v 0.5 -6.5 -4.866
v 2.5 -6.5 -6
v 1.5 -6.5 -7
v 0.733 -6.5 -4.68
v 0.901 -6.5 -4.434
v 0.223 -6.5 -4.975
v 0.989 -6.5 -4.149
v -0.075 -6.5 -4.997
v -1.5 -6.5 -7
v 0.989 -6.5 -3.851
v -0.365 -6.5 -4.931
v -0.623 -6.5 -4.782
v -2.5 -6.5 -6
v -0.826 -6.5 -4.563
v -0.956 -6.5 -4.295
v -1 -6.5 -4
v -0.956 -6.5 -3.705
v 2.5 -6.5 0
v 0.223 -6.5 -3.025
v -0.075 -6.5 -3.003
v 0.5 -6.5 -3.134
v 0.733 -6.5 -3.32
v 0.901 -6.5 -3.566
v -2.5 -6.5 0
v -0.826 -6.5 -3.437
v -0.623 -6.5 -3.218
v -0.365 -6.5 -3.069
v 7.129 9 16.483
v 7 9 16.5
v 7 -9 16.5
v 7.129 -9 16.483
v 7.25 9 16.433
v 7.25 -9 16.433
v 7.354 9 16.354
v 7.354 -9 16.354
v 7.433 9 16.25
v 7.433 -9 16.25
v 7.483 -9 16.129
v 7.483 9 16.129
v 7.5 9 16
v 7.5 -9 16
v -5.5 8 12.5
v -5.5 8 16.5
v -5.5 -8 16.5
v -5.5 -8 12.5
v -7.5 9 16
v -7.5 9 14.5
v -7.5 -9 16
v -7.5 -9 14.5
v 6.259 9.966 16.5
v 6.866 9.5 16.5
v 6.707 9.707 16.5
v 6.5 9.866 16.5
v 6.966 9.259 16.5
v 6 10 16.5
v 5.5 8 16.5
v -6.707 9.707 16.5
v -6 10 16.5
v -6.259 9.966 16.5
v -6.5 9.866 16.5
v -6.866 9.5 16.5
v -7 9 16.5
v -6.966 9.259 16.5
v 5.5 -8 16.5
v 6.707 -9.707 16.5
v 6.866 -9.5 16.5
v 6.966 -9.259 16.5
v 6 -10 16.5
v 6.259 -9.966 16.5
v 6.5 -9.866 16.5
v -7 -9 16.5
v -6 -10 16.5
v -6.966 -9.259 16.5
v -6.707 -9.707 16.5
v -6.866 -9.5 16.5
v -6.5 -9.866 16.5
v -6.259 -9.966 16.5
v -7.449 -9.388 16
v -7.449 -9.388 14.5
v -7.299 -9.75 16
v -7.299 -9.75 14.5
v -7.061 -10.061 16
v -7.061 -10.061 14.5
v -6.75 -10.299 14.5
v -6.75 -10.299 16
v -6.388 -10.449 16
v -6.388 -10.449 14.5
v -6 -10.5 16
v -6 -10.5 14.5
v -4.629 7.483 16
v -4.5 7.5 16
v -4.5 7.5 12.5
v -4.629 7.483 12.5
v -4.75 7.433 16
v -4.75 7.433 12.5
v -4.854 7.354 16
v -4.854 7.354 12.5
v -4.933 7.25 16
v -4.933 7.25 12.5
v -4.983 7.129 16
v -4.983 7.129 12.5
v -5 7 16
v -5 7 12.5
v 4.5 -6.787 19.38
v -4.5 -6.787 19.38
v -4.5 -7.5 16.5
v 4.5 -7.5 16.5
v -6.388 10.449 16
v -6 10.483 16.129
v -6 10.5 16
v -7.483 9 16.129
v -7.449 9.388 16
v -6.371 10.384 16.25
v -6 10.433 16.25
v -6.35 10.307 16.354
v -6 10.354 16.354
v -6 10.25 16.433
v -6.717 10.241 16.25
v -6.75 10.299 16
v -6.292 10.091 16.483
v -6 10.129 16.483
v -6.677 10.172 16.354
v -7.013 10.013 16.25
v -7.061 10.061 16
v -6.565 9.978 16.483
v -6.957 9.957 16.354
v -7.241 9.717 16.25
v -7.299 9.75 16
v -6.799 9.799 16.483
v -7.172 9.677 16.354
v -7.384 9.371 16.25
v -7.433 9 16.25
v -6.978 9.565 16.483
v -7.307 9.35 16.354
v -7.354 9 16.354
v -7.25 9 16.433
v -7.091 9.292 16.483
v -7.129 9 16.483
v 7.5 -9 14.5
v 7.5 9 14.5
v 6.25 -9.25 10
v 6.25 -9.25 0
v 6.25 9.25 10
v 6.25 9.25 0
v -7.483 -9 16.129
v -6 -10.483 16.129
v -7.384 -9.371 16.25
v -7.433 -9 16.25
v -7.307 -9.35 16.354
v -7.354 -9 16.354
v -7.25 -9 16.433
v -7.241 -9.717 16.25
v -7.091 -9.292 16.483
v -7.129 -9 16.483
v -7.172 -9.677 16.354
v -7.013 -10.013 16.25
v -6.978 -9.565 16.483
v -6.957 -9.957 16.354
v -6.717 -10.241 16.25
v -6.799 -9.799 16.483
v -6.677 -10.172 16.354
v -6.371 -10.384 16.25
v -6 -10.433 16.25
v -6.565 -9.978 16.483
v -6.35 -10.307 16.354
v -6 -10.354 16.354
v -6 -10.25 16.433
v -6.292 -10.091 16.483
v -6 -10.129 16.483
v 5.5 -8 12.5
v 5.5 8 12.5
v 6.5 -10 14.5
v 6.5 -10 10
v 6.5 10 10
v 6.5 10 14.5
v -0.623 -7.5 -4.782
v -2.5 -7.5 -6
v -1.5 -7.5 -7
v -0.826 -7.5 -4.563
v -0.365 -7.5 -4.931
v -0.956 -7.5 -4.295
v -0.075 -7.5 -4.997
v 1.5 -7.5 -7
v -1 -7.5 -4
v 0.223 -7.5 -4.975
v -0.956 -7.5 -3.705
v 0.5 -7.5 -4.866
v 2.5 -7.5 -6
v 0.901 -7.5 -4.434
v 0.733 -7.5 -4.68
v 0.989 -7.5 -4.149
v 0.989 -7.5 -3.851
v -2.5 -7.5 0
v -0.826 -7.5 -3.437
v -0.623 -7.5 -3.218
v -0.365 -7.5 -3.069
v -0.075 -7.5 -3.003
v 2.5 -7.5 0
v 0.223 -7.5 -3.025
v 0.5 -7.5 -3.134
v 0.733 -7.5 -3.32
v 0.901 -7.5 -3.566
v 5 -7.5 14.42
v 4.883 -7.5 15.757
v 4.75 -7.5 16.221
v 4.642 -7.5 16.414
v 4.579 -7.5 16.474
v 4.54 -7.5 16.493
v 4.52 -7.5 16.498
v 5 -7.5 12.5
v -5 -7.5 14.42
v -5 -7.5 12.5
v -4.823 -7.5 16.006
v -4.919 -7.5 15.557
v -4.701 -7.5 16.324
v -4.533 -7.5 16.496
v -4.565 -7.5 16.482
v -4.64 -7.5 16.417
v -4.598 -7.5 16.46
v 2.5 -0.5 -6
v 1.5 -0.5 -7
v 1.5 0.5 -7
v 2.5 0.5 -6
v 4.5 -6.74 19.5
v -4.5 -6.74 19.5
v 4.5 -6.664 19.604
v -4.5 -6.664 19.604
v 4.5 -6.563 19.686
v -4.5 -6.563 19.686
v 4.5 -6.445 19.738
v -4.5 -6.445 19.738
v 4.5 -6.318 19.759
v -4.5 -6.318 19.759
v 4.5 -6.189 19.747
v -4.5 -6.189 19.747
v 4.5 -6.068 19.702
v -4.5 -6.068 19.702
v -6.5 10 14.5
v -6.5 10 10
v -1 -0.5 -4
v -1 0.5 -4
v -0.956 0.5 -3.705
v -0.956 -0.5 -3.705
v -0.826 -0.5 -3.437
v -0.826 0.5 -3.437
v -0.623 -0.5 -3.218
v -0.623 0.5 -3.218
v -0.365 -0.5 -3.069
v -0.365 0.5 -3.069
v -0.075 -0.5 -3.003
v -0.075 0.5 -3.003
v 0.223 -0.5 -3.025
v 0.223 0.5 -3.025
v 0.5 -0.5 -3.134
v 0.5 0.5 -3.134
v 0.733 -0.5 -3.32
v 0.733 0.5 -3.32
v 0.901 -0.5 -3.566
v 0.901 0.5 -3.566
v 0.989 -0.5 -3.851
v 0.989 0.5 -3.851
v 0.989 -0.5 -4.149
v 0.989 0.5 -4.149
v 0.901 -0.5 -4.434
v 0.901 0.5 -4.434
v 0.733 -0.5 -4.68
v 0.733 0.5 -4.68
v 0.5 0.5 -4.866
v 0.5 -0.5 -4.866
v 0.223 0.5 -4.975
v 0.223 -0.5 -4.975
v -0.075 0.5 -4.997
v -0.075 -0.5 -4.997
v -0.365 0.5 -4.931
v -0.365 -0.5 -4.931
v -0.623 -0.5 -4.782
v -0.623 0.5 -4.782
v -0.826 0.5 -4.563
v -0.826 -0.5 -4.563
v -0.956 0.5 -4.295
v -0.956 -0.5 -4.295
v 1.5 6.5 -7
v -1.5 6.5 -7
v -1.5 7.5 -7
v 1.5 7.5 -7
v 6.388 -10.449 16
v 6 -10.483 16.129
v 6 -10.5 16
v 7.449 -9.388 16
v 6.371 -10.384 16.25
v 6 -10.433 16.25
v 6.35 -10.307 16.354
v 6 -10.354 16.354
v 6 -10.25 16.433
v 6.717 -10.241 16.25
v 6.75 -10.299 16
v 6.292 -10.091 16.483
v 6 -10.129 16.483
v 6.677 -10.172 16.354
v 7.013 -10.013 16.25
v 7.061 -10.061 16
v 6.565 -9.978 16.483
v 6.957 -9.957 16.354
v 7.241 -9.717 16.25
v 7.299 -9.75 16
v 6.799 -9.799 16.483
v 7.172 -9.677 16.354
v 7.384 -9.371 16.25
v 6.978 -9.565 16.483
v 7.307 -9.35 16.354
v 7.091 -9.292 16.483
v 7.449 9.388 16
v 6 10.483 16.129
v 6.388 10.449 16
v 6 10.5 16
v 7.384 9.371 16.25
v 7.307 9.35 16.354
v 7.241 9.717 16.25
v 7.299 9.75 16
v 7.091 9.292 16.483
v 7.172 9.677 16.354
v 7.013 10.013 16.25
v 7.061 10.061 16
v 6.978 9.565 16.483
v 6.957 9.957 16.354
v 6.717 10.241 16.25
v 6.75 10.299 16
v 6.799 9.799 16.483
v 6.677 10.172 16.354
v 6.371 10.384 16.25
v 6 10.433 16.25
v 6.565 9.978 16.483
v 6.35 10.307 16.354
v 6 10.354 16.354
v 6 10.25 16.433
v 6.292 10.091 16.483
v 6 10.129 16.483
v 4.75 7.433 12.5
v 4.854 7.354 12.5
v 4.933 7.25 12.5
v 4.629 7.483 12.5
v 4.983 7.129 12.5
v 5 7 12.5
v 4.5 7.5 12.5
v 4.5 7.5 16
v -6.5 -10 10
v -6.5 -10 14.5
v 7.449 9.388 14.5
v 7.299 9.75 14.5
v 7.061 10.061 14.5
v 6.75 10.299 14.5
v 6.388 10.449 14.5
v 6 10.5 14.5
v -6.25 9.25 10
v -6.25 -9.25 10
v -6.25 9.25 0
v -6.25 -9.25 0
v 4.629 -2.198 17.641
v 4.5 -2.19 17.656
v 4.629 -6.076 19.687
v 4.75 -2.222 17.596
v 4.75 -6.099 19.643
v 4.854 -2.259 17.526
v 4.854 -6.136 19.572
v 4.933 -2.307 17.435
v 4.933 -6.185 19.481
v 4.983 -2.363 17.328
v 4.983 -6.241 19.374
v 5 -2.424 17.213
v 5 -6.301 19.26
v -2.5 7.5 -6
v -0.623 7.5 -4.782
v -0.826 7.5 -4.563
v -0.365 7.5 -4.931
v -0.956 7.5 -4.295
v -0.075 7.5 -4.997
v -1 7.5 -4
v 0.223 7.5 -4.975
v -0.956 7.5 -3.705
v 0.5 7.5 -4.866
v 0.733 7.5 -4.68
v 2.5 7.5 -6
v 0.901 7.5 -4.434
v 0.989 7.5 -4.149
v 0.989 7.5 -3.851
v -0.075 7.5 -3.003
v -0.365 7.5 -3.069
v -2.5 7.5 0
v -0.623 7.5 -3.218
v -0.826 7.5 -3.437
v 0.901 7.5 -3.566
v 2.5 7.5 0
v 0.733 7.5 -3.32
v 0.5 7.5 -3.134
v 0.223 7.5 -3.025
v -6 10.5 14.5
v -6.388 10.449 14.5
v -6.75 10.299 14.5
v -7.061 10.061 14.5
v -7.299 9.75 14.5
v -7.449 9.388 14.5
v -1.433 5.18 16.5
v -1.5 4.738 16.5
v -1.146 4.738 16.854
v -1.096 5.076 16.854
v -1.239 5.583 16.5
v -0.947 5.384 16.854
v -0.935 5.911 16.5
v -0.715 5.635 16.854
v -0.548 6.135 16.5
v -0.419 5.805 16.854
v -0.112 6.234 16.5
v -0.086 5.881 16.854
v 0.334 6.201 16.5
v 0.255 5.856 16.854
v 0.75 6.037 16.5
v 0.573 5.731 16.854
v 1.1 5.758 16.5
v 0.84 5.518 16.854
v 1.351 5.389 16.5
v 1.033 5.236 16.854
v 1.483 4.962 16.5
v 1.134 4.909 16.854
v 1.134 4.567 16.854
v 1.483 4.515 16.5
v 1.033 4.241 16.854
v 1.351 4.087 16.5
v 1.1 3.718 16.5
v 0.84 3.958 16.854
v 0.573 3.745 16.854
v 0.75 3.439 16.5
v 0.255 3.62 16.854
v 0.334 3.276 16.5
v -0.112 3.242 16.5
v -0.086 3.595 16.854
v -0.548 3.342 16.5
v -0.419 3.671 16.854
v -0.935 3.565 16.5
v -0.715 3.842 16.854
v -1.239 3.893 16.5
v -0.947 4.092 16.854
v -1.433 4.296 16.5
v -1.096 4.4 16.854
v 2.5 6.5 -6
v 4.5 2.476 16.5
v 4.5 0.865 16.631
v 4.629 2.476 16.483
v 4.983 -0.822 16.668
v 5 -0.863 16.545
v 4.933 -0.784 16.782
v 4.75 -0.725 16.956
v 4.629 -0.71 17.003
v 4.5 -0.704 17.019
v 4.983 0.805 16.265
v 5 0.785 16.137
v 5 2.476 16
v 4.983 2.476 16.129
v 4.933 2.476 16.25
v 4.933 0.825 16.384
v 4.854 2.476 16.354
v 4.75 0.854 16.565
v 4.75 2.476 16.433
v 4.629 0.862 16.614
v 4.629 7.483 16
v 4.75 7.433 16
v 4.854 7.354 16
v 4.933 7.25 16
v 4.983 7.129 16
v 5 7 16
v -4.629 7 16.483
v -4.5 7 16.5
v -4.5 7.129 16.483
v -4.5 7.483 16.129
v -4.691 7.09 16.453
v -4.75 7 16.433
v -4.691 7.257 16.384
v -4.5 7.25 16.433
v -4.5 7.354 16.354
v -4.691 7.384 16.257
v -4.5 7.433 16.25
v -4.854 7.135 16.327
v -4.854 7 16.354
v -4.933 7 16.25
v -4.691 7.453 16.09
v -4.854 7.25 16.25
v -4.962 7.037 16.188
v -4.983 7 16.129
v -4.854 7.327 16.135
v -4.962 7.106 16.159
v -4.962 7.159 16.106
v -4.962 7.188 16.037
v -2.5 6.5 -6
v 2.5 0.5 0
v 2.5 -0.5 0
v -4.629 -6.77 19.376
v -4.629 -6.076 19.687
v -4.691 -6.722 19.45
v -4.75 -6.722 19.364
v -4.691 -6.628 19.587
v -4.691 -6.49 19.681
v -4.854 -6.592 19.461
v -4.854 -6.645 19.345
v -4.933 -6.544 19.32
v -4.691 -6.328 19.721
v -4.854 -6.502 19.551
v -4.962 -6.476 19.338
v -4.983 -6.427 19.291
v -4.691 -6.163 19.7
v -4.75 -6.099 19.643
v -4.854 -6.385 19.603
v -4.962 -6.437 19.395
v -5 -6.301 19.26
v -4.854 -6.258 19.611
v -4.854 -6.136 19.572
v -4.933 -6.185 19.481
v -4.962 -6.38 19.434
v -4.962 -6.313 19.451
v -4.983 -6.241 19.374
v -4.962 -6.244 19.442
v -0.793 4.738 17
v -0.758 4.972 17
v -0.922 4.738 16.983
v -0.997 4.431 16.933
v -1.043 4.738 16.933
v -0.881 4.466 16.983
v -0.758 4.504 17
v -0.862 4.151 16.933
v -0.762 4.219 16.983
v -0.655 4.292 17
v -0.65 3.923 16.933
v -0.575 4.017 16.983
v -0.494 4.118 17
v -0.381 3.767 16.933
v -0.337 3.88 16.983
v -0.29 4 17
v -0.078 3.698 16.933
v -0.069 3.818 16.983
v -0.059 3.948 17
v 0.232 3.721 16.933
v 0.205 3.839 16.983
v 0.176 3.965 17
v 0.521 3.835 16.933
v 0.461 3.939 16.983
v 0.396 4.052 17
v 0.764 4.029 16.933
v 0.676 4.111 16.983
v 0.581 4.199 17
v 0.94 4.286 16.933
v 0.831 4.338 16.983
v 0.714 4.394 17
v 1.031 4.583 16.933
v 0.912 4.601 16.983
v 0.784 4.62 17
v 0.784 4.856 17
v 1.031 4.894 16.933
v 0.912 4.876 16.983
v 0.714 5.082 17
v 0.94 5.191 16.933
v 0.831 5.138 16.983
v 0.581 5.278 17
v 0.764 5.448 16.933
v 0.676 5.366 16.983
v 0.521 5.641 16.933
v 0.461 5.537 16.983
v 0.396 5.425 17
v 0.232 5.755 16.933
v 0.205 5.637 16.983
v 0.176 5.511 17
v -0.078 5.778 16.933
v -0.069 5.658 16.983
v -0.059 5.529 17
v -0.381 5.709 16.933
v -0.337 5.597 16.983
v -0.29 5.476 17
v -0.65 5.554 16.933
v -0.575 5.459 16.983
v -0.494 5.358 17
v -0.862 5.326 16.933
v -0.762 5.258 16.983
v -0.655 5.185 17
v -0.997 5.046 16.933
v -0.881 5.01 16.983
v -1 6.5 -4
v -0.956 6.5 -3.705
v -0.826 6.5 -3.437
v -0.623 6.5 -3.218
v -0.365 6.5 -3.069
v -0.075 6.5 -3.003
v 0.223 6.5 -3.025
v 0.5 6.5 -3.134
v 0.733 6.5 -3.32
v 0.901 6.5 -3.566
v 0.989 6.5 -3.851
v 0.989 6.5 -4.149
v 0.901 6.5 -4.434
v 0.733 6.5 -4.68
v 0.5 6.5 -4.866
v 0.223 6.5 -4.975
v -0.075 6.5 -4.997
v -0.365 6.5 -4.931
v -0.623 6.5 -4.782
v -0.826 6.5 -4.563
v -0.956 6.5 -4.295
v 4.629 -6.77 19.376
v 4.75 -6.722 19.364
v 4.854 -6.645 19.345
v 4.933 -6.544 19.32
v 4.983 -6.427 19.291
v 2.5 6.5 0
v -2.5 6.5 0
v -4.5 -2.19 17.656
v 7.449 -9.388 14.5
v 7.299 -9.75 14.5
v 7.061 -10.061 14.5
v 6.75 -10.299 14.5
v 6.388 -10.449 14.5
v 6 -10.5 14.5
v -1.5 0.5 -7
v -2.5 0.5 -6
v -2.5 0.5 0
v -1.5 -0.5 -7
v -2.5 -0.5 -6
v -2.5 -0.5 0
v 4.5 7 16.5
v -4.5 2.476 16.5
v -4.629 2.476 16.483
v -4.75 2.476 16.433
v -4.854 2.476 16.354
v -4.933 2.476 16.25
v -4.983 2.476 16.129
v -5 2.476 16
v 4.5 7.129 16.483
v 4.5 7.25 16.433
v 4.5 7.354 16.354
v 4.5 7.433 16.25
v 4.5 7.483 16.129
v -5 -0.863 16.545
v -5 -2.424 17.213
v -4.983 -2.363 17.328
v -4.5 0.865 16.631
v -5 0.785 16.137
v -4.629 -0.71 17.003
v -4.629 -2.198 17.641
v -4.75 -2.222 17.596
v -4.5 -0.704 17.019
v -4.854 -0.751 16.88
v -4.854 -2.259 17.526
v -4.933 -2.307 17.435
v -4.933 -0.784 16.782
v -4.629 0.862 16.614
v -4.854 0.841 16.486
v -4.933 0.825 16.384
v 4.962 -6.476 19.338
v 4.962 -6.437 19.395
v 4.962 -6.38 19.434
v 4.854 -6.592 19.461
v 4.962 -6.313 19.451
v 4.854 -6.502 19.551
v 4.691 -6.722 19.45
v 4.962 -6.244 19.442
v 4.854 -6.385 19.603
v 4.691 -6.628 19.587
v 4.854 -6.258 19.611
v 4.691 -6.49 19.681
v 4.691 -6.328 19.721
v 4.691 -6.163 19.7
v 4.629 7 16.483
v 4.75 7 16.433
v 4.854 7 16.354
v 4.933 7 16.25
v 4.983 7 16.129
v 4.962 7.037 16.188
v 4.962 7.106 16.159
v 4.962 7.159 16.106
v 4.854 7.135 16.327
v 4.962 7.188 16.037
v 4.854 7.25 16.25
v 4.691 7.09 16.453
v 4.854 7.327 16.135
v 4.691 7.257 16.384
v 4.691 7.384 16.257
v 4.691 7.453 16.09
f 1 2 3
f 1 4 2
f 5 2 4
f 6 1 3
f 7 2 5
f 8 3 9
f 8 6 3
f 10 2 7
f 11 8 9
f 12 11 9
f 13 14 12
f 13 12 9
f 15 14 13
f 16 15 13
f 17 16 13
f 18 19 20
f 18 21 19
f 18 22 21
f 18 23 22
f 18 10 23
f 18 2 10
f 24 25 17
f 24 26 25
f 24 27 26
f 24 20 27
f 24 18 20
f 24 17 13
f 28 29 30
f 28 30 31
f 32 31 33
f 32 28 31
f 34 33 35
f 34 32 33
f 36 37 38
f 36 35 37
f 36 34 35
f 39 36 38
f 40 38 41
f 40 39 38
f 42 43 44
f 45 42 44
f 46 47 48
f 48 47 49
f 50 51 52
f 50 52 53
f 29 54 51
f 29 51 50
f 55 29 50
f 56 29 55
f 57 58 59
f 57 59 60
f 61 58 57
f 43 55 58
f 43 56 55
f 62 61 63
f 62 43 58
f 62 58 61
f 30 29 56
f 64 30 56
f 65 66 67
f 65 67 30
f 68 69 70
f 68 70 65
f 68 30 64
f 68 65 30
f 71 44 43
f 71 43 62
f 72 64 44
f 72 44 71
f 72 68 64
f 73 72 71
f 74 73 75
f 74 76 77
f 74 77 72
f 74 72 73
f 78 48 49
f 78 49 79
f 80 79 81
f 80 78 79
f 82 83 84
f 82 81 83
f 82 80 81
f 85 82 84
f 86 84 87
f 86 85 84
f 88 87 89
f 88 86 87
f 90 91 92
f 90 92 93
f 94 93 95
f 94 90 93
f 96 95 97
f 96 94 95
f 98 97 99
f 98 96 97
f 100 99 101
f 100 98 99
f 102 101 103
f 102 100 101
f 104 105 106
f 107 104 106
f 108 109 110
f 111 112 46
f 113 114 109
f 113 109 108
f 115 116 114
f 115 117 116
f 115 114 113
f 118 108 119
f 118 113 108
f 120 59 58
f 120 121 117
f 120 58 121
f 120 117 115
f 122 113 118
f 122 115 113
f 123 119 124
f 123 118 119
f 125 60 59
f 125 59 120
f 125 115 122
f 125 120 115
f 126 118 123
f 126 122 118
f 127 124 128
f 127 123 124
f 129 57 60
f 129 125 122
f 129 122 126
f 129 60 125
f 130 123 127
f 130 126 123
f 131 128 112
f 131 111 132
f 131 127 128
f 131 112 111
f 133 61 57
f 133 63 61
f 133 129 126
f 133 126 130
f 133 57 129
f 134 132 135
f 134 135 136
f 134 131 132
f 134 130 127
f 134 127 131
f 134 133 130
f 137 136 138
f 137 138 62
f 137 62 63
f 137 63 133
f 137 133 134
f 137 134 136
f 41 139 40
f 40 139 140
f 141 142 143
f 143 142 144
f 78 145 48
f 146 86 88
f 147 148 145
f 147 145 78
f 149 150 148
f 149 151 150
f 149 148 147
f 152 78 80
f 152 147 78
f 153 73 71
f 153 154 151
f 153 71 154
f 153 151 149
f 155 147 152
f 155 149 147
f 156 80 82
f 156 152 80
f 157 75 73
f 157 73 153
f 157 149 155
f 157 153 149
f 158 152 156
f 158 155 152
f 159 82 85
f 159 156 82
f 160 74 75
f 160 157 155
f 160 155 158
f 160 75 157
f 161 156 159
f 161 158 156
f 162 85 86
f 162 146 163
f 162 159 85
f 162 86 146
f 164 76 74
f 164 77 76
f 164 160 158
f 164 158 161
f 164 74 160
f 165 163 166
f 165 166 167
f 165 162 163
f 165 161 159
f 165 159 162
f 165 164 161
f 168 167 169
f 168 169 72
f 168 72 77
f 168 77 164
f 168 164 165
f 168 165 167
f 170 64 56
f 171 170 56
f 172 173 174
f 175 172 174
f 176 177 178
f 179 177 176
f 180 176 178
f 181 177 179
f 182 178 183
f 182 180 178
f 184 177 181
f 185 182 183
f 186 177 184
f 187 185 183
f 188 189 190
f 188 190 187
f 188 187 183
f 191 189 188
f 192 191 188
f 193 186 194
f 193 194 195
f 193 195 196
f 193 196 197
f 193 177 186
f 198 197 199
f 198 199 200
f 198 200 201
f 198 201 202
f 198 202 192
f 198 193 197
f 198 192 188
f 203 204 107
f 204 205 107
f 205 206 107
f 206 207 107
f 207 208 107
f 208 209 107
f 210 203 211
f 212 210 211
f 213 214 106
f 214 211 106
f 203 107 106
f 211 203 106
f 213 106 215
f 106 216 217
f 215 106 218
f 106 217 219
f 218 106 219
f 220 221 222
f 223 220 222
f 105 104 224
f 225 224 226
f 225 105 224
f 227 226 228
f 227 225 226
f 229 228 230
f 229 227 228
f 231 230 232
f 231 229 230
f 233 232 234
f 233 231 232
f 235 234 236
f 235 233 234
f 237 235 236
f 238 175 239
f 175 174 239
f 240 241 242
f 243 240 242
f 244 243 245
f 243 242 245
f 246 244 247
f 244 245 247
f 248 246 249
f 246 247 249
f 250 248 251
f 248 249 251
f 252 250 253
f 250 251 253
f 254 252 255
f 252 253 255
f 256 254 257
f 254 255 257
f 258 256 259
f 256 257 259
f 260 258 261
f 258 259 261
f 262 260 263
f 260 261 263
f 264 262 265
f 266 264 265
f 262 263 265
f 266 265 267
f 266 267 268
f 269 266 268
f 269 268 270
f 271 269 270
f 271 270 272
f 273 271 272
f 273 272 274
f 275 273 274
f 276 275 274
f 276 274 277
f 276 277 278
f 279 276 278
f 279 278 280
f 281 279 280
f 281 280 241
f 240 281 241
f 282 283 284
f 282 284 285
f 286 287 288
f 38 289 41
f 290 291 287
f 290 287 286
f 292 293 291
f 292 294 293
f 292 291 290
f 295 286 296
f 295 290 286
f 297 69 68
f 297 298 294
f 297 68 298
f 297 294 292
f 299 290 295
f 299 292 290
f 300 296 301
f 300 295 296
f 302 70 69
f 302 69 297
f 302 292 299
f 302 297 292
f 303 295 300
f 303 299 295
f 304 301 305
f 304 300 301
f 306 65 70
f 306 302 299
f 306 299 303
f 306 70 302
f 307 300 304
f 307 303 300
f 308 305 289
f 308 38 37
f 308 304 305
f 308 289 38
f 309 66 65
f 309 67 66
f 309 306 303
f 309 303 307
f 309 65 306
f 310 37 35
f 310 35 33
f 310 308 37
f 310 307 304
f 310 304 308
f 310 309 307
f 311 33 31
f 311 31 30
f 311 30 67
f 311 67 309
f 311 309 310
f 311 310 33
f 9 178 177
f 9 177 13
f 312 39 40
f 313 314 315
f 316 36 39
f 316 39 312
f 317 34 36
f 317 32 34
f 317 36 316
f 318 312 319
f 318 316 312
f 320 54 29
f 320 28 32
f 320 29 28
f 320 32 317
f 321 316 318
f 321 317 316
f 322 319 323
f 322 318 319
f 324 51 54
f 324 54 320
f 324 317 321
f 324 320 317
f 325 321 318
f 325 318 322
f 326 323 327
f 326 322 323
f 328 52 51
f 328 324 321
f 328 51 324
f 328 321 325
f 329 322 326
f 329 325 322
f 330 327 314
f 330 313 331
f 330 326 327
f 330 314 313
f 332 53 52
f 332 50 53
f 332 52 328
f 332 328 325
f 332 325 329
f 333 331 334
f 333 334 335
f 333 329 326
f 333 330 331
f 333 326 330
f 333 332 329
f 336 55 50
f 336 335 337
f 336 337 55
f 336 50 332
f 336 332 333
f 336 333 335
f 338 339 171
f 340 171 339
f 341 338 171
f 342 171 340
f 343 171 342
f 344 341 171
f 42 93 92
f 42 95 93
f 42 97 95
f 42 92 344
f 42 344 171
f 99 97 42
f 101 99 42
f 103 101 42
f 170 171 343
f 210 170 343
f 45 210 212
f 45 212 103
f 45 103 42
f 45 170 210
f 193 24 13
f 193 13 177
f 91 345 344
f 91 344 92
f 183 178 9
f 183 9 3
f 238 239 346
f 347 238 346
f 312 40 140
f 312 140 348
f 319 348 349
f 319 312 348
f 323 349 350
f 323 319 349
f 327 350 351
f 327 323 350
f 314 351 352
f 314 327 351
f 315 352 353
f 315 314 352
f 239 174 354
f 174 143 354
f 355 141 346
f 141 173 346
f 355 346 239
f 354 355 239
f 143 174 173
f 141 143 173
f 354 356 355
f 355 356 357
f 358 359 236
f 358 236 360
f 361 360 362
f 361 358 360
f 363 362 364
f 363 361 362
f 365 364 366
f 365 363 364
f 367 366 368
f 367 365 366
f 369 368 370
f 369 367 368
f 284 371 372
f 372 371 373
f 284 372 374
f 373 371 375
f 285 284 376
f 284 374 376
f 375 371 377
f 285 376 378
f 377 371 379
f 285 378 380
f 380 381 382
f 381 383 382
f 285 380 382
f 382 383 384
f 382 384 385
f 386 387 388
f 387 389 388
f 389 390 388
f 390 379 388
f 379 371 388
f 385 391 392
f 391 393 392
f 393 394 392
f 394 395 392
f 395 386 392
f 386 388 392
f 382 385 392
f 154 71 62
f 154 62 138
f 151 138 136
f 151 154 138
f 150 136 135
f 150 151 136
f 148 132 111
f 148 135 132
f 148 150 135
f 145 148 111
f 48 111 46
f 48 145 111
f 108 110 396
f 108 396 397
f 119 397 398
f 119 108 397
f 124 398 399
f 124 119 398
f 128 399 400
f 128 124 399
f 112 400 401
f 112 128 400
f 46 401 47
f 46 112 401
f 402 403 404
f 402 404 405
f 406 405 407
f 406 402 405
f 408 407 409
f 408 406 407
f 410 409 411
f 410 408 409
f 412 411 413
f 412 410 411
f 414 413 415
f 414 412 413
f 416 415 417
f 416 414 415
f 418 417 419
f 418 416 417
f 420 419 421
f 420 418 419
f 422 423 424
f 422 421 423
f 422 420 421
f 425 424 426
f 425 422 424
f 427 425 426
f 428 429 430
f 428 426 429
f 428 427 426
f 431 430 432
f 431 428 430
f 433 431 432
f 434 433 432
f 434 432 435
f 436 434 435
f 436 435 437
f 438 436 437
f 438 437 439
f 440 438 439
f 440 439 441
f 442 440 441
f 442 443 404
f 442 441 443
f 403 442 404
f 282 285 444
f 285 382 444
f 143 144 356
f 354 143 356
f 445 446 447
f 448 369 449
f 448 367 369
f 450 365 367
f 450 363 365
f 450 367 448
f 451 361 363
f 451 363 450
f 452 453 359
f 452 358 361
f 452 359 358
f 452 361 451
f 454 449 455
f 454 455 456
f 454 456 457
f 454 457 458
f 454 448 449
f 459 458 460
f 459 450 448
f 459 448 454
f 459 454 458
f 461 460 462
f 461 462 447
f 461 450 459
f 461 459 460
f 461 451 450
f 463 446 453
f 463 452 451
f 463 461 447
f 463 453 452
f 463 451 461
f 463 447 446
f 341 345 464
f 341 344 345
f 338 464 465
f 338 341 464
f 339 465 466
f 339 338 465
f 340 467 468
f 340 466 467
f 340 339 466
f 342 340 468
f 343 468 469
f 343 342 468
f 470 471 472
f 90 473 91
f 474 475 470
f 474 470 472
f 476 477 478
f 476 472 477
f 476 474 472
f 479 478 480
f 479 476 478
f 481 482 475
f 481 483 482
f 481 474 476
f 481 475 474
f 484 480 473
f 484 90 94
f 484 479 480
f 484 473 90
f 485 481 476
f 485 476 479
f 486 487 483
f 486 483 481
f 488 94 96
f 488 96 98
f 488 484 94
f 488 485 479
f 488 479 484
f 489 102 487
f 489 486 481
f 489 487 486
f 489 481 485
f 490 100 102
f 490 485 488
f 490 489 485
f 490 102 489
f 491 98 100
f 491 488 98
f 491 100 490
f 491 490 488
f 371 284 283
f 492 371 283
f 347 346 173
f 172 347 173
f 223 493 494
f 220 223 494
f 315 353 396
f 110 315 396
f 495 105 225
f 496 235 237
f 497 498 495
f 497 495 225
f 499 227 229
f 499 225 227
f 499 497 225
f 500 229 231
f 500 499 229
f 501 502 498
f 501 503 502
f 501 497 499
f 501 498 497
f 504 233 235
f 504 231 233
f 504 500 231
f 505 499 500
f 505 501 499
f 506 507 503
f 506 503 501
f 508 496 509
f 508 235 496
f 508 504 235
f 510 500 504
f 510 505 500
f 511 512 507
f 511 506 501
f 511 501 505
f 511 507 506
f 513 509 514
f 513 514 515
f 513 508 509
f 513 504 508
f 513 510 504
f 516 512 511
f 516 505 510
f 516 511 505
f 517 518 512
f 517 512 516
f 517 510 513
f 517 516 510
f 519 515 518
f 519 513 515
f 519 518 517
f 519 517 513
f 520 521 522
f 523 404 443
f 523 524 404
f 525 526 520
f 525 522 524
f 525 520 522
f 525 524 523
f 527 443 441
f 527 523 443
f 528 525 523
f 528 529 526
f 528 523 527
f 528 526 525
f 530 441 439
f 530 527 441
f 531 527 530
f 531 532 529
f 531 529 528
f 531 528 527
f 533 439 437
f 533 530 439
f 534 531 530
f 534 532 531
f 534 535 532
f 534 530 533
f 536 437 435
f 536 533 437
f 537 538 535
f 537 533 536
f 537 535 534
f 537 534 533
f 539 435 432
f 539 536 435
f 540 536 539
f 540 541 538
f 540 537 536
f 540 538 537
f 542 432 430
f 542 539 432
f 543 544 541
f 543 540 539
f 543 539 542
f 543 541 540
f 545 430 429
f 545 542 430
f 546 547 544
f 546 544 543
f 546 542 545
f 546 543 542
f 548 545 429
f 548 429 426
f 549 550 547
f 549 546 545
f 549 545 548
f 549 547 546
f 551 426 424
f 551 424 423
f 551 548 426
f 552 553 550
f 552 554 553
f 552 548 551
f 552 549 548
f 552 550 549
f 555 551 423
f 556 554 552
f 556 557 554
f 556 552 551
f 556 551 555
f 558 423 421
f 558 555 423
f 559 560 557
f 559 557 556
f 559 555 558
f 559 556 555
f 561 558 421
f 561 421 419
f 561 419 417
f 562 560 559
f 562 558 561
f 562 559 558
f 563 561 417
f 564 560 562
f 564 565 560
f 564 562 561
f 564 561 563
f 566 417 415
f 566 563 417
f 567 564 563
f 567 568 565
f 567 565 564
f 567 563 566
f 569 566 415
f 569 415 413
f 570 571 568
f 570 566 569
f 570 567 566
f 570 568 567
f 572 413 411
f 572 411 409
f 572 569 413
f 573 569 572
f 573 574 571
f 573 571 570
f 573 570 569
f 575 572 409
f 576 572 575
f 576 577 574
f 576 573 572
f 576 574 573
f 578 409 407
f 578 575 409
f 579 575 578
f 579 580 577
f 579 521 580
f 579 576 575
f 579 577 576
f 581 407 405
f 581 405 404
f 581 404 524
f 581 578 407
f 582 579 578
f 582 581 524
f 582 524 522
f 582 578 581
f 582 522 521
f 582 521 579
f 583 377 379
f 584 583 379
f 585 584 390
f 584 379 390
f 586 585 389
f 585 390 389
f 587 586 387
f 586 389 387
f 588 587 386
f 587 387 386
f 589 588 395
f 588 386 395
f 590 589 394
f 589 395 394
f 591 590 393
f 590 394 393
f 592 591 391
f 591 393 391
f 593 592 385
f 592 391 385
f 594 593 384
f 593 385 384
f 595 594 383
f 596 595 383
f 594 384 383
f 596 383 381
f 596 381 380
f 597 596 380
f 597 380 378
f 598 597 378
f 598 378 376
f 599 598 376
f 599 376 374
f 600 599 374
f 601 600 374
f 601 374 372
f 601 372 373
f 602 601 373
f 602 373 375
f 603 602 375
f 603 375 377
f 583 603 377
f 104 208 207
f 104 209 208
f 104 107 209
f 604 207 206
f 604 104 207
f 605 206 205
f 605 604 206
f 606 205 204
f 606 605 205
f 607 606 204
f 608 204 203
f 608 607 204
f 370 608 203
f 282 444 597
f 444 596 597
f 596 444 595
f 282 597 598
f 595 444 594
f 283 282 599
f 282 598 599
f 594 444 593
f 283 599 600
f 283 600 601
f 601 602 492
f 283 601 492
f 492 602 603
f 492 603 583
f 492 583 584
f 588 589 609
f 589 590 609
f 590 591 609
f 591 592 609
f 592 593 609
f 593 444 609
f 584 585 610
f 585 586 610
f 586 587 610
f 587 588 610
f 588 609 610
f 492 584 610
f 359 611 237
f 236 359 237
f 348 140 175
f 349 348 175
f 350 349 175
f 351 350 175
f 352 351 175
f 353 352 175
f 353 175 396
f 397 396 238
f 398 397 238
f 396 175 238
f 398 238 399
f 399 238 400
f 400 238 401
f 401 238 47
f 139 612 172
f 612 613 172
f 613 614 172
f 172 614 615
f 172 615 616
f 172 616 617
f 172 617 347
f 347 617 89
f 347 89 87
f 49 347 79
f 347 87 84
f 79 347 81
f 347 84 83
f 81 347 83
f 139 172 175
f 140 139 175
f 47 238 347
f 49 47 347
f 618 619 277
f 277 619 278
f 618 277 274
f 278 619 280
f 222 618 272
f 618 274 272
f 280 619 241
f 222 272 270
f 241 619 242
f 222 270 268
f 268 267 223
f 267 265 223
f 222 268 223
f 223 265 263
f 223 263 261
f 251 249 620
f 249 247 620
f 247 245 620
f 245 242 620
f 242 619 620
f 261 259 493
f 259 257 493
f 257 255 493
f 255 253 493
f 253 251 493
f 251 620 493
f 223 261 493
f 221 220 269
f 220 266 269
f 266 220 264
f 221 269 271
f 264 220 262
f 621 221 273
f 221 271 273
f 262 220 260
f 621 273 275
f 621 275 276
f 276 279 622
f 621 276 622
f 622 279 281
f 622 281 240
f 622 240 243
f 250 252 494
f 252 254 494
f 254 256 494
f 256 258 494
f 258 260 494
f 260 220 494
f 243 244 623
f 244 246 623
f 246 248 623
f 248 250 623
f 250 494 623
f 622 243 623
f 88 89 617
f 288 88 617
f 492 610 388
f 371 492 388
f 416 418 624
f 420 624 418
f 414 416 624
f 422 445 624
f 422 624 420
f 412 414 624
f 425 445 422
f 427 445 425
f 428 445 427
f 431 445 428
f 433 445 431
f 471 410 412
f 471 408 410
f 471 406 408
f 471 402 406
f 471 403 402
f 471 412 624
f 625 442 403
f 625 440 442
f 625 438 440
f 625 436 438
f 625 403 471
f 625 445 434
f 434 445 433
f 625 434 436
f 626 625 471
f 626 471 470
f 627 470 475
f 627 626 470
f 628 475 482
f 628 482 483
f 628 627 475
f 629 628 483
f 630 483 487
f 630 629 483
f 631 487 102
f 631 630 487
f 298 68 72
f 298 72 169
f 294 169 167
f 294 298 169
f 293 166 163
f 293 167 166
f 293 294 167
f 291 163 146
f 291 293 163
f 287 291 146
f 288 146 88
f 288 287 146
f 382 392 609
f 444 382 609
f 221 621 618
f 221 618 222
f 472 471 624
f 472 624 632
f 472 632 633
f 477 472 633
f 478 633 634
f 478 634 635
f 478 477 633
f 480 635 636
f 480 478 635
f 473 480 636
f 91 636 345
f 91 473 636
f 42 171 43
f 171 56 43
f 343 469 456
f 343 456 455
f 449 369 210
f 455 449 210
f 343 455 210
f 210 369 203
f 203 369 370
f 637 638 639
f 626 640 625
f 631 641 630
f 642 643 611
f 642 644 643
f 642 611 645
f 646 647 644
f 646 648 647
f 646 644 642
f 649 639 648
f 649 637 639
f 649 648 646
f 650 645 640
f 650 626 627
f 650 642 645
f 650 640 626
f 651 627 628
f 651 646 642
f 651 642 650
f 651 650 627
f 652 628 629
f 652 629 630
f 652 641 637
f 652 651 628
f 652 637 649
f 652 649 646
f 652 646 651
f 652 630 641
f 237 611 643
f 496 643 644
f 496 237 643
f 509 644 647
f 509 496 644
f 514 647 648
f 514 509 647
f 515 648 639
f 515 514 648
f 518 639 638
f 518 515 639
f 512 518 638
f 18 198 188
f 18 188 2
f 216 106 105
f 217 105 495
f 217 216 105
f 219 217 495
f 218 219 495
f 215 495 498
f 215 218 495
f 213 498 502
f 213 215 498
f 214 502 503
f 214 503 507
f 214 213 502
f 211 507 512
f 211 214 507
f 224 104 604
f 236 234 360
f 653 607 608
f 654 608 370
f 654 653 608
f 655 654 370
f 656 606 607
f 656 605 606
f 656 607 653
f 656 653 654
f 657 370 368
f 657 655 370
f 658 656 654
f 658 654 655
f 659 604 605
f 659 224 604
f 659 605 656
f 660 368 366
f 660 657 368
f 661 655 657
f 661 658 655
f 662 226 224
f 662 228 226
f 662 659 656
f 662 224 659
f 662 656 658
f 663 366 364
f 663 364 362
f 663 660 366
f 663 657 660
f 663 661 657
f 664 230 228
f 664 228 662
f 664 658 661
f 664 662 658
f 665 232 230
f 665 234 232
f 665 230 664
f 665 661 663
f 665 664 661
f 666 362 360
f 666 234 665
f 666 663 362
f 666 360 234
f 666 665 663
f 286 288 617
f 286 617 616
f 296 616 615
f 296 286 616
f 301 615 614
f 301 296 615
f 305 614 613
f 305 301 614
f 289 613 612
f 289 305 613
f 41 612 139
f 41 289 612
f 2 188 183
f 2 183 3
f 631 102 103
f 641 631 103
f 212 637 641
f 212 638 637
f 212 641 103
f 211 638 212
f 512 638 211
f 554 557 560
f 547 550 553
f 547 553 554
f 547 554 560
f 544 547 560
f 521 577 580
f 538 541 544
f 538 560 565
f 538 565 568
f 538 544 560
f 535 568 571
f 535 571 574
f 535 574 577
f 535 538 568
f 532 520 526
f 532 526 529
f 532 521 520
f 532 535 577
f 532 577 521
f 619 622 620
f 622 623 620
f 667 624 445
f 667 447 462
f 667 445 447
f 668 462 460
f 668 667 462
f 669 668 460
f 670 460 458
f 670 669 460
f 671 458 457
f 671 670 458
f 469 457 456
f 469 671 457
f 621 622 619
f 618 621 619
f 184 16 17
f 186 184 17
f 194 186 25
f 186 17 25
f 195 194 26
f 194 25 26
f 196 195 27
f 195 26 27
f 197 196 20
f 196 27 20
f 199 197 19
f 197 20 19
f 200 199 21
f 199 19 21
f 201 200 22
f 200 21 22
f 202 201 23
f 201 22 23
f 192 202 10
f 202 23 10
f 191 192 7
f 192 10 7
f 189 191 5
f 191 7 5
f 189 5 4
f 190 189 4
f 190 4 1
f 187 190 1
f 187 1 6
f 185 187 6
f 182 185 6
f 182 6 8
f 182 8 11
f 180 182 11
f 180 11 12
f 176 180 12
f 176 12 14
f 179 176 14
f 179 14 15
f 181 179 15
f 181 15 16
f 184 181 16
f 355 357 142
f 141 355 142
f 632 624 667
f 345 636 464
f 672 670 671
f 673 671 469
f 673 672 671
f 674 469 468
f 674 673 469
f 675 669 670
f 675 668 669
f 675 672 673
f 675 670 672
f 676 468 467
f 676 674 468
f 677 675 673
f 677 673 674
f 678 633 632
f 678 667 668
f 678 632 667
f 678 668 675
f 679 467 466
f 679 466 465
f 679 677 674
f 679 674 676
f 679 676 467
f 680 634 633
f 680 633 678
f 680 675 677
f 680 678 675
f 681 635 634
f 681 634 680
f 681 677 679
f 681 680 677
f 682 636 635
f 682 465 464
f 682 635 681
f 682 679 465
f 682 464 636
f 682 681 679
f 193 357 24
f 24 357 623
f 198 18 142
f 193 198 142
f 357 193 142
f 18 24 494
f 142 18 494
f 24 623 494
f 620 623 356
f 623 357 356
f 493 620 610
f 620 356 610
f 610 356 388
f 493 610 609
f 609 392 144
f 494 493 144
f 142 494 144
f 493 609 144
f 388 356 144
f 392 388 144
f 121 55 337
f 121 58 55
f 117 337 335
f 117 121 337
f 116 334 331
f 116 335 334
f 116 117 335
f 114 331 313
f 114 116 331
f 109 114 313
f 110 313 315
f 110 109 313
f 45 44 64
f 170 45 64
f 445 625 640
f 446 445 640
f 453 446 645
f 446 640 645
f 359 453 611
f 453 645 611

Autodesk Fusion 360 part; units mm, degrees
sketch "Sketch1" plane through (0, 0, 0) normal (0, 0, 1) x (1, 0, 0)
  line L0 (6.25, 9.25) -> (-6.25, 9.25)
  line L1 (-6.25, 9.25) -> (-6.25, -9.25)
  line L2 (-6.25, -9.25) -> (6.25, -9.25)
  line L3 (6.25, -9.25) -> (6.25, 9.25)
  line L4 (6.25, 9.25) -> (-6.25, -9.25) construction
  line L5 (-6.25, 9.25) -> (6.25, -9.25) construction
  dimension "d1" = 12.5
  dimension "d2" = 18.5
extrude "Extrude1" add sketch "Sketch1" along normal blind 10 makes body 1
sketch "Sketch2" plane through (0, 0, 10) normal (0, 0, 1) x (-1, 0, 0)
  line L0 (-6.25, 9.25) -> (-6.25, -9.25)
  line L1 (-6.25, -9.25) -> (6.25, -9.25)
  line L2 (6.25, -9.25) -> (6.25, 9.25)
  line L3 (6.25, 9.25) -> (-6.25, 9.25)
  line L4 (-6.5, -10) -> (6.5, -10)
  line L5 (6.5, -10) -> (6.5, 10)
  line L6 (6.5, 10) -> (-6.5, 10)
  line L7 (-6.5, 10) -> (-6.5, -10)
  line L8 (-6.5, -10) -> (6.5, 10) construction
  line L9 (6.5, -10) -> (-6.5, 10) construction
  dimension "d5" = 13
  dimension "d6" = 20
extrude "Extrude2" add sketch "Sketch2" along normal blind 4.5 contours L0 L1 L2 L3 | L4 L5 L6 L7 bodies 1
sketch "Sketch3" plane through (0, 0, 14.5) normal (0, 0, 1) x (-1, 0, 0)
  line L0 (-6.5, 10) -> (-6.5, -10)
  line L1 (-6.5, -10) -> (6.5, -10)
  line L2 (6.5, -10) -> (6.5, 10)
  line L3 (6.5, 10) -> (-6.5, 10)
  line L4 (-7.5, -10.5) -> (7.5, -10.5)
  line L5 (7.5, -10.5) -> (7.5, 10.5)
  line L6 (7.5, 10.5) -> (-7.5, 10.5)
  line L7 (-7.5, 10.5) -> (-7.5, -10.5)
  line L8 (-7.5, -10.5) -> (7.5, 10.5) construction
  line L9 (7.5, -10.5) -> (-7.5, 10.5) construction
  dimension "d9" = 15
  dimension "d10" = 21
extrude "Extrude3" add sketch "Sketch3" along normal blind 2 contours L0 L1 L2 L3 | L4 L5 L6 L7 bodies 1
sketch "Sketch4" plane through (0, 0, 16.5) normal (0, 0, 1) x (-1, 0, 0)
  line L0 (-7.5, 10.5) -> (-7.5, -10.5)
  line L1 (-7.5, -10.5) -> (7.5, -10.5)
  line L2 (7.5, -10.5) -> (7.5, 10.5)
  line L3 (7.5, 10.5) -> (-7.5, 10.5)
  line L4 (-5, -7.5) -> (5, -7.5)
  line L5 (5, -7.5) -> (5, 7.5)
  line L6 (5, 7.5) -> (-5, 7.5)
  line L7 (-5, 7.5) -> (-5, -7.5)
  line L8 (-5, -7.5) -> (5, 7.5) construction
  line L9 (5, -7.5) -> (-5, 7.5) construction
  dimension "d13" = 10
  dimension "d14" = 15
extrude "Extrude4" add sketch "Sketch4" along normal blind 3.5 contours L4 L5 L6 L7 bodies 1
sketch "Sketch5" plane through (5, 0, 0) normal (1, 0, 0) x (0, 1, 0)
  line L0 (-7.5, 16.5) -> (7.5, 16.5)
  line L1 (7.5, 16.5) -> (7.5, 20)
  line L2 (7.5, 20) -> (-7.5, 20)
  line L3 (-7.5, 20) -> (-7.5, 16.5)
  line L4 (0, 16.5) -> (7.5, 16.5)
  line L5 (0, 16.5) -> (-6.6332, 20)
  line L6 (-6.6332, 20) -> (-7.5, 16.5)
  dimension "d17" = 7.5
extrude "Extrude5" cut sketch "Sketch5" against normal blind 10 contours L2 L3 L6 | L0 L1 L2 L4 L5 bodies 1
sketch "Sketch6" plane through (0, 0, 16.5) normal (0, 0, 1) x (-1, 0, 0)
  line L0 (-5, 7.5) -> (5, 7.5)
  line L1 (5, 7.5) -> (5, 0)
  line L2 (5, 0) -> (-5, 0)
  line L3 (-5, 0) -> (-5, 7.5)
  line L4 (-7.5, 10.5) -> (-7.5, -10.5)
  line L5 (-7.5, -10.5) -> (7.5, -10.5)
  line L6 (7.5, -10.5) -> (7.5, 10.5)
  line L7 (7.5, 10.5) -> (-7.5, 10.5)
  line L8 (-5, -7.5) -> (5, -7.5)
  line L9 (5, -7.5) -> (5, 7.5)
  line L10 (5, 7.5) -> (-5, 7.5)
  line L11 (-5, 7.5) -> (-5, -7.5)
  line L12 (-5, -7.5) -> (5, 7.5) construction
  line L13 (5, -7.5) -> (-5, 7.5) construction
  line L14 (5.5, 8) -> (-5.5, 8)
  line L15 (-5.5, 8) -> (-5.5, -8)
  line L16 (-5.5, -8) -> (5.5, -8)
  line L17 (5.5, -8) -> (5.5, 8)
  dimension "d20" = 10
  dimension "d21" = 15
  dimension "d22" = 0.5
extrude "Extrude6" cut sketch "Sketch6" against normal blind 4 contours L14 L15 L16 L17 bodies 1
fillet "Fillet1" radius 1.5 4 edges at (7.5, -10.5, 15.5) (-7.5, -10.5, 15.5) (-7.5, 10.5, 15.5) (7.5, 10.5, 15.5) on bodies 1
fillet "Fillet2" radius 0.5 8 edges at (-7.0607, 10.0607, 16.5) (-7.5, 0, 16.5) (-7.0607, -10.0607, 16.5) (0, -10.5, 16.5) (7.0607, -10.0607, 16.5) (7.5, 0, 16.5) (7.0607, 10.0607, 16.5) (0, 10.5, 16.5) on bodies 1
fillet "Fillet3" radius 10 1 edges at (0, 0, 16.5) on bodies 1
fillet "Fillet4" radius 0.5 2 edges at (0, 7.5, 16.5) (0, -6.6332, 20) on bodies 1
fillet "Fillet5" radius 0.5 14 edges at (-5, -7.1434, 17.9399) (-5, -6.506, 19.7159) (-5, -4.1292, 18.6788) (-5, 0.0726, 16.7932) (-5, 4.7382, 16.5) (-5, 7.3536, 16.3536) (-5, 7.5, 14.25) (5, 7.5, 14.25) (5, 7.3536, 16.3536) (5, 4.7382, 16.5) (5, 0.0726, 16.7932) (5, -4.1292, 18.6788) (5, -6.506, 19.7159) (5, -7.1434, 17.9399) on bodies 1
sketch "Sketch7" plane through (0, 0, 16.5) normal (0, 0, 1) x (-1, 0, 0)
  line L0 (-4.5, -2.4764) -> (-4.5, -7)
  line L1 (-4.5, -7) -> (4.5, -7)
  line L2 (4.5, -7) -> (4.5, -2.4764)
  line L3 (4.5, -2.4764) -> (-4.5, -2.4764)
  line L4 (-4.5, -7) -> (4.5, -2.4764) construction
  circle A0 centre (0, -4.7382) radius 1.5
  dimension "d35" = 3
extrude "Extrude7" add sketch "Sketch7" along normal blind 0.5 draft -45 contours A0 bodies 1
fillet "Fillet6" radius 0.5 1 edges at (0.9323, 4.3766, 17) on bodies 1
sketch "Sketch8" plane through (0, 0, 0) normal (0, 0, -1) x (1, 0, 0)
  line L0 (6.25, -9.25) -> (6.25, 9.25)
  line L1 (6.25, 9.25) -> (-6.25, 9.25)
  line L2 (-6.25, 9.25) -> (-6.25, -9.25)
  line L3 (-6.25, -9.25) -> (6.25, -9.25)
  line L4 (2.5, 7.5) -> (-2.5, 7.5) construction
  line L5 (-2.5, 7.5) -> (-2.5, -7.5) construction
  line L6 (-2.5, -7.5) -> (2.5, -7.5) construction
  line L7 (2.5, -7.5) -> (2.5, 7.5) construction
  line L8 (2.5, 7.5) -> (-2.5, -7.5) construction
  line L9 (-2.5, 7.5) -> (2.5, -7.5) construction
  line L10 (-2.5, 7.5) -> (2.5, 7.5)
  line L11 (2.5, 7.5) -> (2.5, 6.5)
  line L12 (2.5, 6.5) -> (-2.5, 6.5)
  line L13 (-2.5, 6.5) -> (-2.5, 7.5)
  line L14 (-2.5, -7.5) -> (2.5, -7.5)
  line L15 (2.5, -7.5) -> (2.5, -6.5)
  line L16 (2.5, -6.5) -> (-2.5, -6.5)
  line L17 (-2.5, -6.5) -> (-2.5, -7.5)
  line L18 (2.5, 0.5) -> (-2.5, 0.5)
  line L19 (-2.5, 0.5) -> (-2.5, -0.5)
  line L20 (-2.5, -0.5) -> (2.5, -0.5)
  line L21 (2.5, -0.5) -> (2.5, 0.5)
  line L22 (2.5, 0.5) -> (-2.5, -0.5) construction
  line L23 (-2.5, 0.5) -> (2.5, -0.5) construction
  dimension "d40" = 5
  dimension "d41" = 15
  dimension "d42" = 5
  dimension "d43" = 1
  dimension "d44" = 5
  dimension "d45" = 1
  dimension "d46" = 5
  dimension "d47" = 1
extrude "Extrude8" add sketch "Sketch8" along normal blind 7 separate body contours L10 L11 L12 L13 | L14 L15 L16 L17 | L18 L19 L20 L21 makes body 2 at (0.8333, 6.5, -2.3333) makes body 3 at (-0.8333, 0.5, -2.3333) makes body 4 at (-0.8333, -7.5, -2.3333)
sketch "Sketch9" plane through (0, 7.5, 0) normal (0, 1, 0) x (-1, 0, 0)
  line L0 (2.5, 0) -> (-2.5, 0)
  line L1 (-2.5, 0) -> (-2.5, -7)
  line L2 (-2.5, -7) -> (2.5, -7)
  line L3 (2.5, -7) -> (2.5, 0)
  line L4 (0, -7) -> (0, -4)
  circle A0 centre (0, -4) radius 1
  dimension "d50" = 3
  dimension "d51" = 2
extrude "Extrude9" cut sketch "Sketch9" against normal blind 15 contours A0 bodies 2 3 4
chamfer "Chamfer1" distance 1 angle 45 6 edges at (2.5, -7, -7) (-2.5, -7, -7) (2.5, 0, -7) (-2.5, 0, -7) (2.5, 7, -7) (-2.5, 7, -7) on bodies 2 3 4
combine "Combine1" operation add target body 1 tool bodies 2 3 4
